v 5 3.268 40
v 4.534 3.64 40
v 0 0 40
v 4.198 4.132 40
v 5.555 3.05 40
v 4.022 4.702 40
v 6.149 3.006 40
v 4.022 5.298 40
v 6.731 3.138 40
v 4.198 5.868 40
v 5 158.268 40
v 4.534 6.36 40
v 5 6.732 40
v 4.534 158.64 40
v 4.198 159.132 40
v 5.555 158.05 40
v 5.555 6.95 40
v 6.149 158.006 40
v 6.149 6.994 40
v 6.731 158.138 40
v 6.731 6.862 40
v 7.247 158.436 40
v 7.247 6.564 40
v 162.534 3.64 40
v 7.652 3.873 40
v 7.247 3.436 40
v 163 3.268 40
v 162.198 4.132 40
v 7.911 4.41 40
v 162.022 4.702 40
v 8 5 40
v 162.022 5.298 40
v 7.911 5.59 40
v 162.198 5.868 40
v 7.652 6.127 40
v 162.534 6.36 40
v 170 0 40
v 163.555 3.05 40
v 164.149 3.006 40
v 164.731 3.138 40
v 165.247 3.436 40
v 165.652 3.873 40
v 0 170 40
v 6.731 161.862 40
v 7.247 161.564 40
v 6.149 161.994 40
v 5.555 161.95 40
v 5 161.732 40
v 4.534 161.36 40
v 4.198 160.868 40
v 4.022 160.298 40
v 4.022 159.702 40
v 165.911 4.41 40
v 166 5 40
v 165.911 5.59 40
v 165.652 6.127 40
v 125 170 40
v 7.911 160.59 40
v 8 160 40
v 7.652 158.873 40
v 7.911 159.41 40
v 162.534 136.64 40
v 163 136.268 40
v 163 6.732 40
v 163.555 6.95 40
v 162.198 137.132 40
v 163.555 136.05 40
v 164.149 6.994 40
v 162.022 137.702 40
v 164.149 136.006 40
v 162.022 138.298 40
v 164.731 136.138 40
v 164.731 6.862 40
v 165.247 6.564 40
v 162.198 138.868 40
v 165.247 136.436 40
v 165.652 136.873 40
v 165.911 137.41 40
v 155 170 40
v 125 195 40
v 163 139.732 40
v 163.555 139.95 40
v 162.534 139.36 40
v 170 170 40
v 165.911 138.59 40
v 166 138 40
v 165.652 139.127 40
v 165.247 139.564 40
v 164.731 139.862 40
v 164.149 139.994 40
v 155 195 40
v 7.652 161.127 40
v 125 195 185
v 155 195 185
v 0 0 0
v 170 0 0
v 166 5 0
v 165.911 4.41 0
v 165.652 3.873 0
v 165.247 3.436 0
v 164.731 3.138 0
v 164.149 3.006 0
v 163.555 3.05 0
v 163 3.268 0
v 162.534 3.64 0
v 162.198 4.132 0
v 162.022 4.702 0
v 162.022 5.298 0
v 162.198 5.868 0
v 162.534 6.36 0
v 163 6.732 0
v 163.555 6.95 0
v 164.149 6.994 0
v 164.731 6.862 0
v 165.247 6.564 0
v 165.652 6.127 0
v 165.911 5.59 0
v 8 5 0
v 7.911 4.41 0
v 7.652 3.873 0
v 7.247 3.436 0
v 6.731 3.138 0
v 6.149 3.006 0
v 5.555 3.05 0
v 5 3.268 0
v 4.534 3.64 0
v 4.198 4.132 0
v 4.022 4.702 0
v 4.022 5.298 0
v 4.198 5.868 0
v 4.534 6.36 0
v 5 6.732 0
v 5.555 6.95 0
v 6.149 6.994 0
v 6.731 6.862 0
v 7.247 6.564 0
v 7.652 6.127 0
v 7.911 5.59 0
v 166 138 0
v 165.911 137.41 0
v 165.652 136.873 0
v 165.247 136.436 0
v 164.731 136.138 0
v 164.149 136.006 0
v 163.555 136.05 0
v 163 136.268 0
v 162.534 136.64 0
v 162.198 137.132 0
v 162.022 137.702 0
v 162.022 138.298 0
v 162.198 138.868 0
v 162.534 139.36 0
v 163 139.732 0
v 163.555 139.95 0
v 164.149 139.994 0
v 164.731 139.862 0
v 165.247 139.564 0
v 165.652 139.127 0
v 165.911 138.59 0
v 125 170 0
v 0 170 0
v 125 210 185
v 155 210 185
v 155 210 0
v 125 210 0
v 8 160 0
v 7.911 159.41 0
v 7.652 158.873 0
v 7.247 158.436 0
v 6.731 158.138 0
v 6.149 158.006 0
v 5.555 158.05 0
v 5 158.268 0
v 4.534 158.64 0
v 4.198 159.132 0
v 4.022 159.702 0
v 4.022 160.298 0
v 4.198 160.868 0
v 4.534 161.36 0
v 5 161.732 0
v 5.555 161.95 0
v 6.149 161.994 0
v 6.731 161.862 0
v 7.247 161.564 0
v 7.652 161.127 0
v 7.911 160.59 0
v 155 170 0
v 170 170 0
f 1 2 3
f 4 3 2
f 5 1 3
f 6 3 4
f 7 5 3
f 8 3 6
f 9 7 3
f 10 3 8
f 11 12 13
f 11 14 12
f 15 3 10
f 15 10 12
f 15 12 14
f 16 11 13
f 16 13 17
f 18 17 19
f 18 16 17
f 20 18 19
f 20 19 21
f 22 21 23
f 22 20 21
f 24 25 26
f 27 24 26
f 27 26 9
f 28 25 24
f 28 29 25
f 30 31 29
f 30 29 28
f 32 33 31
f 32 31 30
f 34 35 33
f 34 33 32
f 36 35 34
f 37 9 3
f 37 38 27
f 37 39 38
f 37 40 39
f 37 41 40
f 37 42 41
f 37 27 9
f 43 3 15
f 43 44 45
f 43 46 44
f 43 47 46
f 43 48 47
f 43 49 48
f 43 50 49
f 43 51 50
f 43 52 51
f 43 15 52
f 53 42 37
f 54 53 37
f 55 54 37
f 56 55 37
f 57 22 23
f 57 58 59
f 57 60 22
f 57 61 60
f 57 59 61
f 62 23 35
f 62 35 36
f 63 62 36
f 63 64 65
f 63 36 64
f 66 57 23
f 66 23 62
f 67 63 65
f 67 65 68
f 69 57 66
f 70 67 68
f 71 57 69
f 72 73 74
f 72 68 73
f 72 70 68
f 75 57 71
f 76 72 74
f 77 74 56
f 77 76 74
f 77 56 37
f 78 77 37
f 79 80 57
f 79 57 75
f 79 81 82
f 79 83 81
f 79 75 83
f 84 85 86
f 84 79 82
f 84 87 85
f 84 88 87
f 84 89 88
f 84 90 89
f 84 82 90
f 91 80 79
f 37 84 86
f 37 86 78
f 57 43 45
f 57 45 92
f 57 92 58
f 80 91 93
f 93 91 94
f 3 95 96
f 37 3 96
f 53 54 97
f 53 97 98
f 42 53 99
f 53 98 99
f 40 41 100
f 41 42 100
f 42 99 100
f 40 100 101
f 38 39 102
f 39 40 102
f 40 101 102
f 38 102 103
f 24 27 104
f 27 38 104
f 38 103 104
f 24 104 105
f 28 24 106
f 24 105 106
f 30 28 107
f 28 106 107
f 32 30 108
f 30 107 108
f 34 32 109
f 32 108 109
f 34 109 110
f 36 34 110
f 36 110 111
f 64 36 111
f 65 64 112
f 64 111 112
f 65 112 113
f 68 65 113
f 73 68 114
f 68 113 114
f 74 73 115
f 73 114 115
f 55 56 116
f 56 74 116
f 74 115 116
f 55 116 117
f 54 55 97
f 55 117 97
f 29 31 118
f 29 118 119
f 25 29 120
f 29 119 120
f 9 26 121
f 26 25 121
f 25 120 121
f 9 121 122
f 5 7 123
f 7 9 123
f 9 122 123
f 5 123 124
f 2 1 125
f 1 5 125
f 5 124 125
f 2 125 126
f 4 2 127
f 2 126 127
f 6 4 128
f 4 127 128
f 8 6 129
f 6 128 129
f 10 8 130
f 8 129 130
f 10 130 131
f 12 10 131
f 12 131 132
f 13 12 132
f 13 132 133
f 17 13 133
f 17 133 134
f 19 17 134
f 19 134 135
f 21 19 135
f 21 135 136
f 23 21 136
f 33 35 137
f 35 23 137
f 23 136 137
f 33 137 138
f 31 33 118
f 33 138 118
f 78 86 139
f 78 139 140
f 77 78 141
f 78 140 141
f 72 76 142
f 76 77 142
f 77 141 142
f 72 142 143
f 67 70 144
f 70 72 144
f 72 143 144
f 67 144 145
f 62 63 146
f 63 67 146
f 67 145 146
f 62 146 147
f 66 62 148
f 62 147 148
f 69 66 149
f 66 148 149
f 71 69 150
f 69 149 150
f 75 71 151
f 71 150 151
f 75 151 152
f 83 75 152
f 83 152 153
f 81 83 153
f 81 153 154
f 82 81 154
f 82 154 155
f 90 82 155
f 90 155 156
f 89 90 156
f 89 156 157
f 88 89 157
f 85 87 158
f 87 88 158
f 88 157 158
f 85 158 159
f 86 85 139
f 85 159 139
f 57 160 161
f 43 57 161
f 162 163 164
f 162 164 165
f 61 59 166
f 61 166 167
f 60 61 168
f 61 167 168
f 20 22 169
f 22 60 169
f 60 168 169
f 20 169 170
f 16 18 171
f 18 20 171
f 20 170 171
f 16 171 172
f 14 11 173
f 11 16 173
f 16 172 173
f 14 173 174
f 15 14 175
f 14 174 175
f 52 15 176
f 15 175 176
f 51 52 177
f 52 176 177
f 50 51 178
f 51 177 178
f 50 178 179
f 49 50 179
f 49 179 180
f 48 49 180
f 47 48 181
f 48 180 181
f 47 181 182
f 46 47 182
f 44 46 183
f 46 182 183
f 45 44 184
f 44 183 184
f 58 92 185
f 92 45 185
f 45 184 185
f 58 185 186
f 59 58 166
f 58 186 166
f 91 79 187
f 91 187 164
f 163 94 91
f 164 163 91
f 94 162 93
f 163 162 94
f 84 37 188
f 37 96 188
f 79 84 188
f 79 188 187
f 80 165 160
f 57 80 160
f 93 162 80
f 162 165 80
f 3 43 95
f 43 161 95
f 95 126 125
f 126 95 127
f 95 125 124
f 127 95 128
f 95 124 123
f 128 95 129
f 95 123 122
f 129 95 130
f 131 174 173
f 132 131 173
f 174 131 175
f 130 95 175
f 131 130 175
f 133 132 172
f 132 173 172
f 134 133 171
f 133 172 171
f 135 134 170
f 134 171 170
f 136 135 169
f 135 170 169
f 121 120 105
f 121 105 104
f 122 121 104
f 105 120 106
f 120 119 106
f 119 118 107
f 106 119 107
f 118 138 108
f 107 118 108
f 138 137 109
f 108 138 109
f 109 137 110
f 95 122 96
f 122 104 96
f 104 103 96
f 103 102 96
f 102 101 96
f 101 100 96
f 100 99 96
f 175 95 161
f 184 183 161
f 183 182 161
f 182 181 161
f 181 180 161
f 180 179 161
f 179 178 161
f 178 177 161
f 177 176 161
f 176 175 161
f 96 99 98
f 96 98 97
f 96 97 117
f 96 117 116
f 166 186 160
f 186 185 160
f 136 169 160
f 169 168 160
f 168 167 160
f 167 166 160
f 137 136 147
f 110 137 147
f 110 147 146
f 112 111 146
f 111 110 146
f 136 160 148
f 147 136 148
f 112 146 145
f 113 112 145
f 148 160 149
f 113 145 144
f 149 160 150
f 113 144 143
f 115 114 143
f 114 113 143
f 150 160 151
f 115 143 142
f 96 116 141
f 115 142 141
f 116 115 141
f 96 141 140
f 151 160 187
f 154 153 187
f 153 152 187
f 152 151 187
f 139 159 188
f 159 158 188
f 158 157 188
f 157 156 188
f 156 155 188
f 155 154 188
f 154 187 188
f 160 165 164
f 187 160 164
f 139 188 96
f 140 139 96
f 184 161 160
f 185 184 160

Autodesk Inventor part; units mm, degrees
ref_plane "YZ Plane" through (0, 0, 0) normal (1, 0, 0) x (0, 1, 0)
ref_plane "XZ Plane" through (0, 0, 0) normal (0, 1, 0) x (-1, 0, 0)
ref_plane "XY Plane" through (0, 0, 0) normal (0, 0, 1) x (1, 0, 0)
sketch "Sketch1" plane through (0, 0, 0) normal (0, 0, 1) x (1, 0, 0)
  line L0 (0, 0) -> (170, 0)
  line L1 (170, 0) -> (170, 170)
  line L2 (170, 170) -> (0, 170)
  line L3 (0, 170) -> (0, 0)
  circle A0 centre (6, 5) radius 2
  circle A1 centre (164, 5) radius 2
  circle A2 centre (164, 138) radius 2
  circle A3 centre (6, 160) radius 2
  line L4 (6, 5) -> (164, 5) construction
  point P0 (85, 5)
  point P1 (85, 0)
  dimension "d0" = 170
  dimension "d1" = 170
  dimension "d2" = 4
  dimension "d3" = 4
  dimension "d4" = 4
  dimension "d5" = 4
  dimension "d6" = 158
  dimension "d7" = 155
  dimension "d8" = 133
  dimension "d9" = 32
extrude "Extrusion1" add sketch "Sketch1" along normal blind 40
sketch "Sketch2" plane through (0, 0, 40) normal (0, 0, 1) x (1, 0, 0)
  line L0 (170, 170) -> (0, 170) projected
  line L1 (125, 170) -> (155, 170)
  line L2 (155, 170) -> (155, 210)
  line L3 (155, 210) -> (125, 210)
  line L4 (125, 210) -> (125, 170)
  line L5 (170, 0) -> (170, 170) projected
  point P0 (0, 0)
  dimension "d12" = 30
  dimension "d13" = 40
  dimension "d14" = 15
extrude "Extrusion2" add sketch "Sketch2" against normal blind 40 and the other way blind 145
sketch "Sketch3" plane through (155, 170, 0) normal (1, 0, 0) x (0, 0, -1)
  line L0 (-185, 0) -> (-40, 0) projected
  line L1 (-185, 0) -> (-40, 0)
  line L2 (-40, 0) -> (-40, 25)
  line L3 (-40, 25) -> (-185, 25)
  line L4 (-185, 25) -> (-185, 0)
  point P0 (0, -170)
  dimension "d19" = 25
extrude "Extrusion3" cut sketch "Sketch3" against normal through all
properties part number "NVIDIA Jetson TX2" material "ABS Plastic"
